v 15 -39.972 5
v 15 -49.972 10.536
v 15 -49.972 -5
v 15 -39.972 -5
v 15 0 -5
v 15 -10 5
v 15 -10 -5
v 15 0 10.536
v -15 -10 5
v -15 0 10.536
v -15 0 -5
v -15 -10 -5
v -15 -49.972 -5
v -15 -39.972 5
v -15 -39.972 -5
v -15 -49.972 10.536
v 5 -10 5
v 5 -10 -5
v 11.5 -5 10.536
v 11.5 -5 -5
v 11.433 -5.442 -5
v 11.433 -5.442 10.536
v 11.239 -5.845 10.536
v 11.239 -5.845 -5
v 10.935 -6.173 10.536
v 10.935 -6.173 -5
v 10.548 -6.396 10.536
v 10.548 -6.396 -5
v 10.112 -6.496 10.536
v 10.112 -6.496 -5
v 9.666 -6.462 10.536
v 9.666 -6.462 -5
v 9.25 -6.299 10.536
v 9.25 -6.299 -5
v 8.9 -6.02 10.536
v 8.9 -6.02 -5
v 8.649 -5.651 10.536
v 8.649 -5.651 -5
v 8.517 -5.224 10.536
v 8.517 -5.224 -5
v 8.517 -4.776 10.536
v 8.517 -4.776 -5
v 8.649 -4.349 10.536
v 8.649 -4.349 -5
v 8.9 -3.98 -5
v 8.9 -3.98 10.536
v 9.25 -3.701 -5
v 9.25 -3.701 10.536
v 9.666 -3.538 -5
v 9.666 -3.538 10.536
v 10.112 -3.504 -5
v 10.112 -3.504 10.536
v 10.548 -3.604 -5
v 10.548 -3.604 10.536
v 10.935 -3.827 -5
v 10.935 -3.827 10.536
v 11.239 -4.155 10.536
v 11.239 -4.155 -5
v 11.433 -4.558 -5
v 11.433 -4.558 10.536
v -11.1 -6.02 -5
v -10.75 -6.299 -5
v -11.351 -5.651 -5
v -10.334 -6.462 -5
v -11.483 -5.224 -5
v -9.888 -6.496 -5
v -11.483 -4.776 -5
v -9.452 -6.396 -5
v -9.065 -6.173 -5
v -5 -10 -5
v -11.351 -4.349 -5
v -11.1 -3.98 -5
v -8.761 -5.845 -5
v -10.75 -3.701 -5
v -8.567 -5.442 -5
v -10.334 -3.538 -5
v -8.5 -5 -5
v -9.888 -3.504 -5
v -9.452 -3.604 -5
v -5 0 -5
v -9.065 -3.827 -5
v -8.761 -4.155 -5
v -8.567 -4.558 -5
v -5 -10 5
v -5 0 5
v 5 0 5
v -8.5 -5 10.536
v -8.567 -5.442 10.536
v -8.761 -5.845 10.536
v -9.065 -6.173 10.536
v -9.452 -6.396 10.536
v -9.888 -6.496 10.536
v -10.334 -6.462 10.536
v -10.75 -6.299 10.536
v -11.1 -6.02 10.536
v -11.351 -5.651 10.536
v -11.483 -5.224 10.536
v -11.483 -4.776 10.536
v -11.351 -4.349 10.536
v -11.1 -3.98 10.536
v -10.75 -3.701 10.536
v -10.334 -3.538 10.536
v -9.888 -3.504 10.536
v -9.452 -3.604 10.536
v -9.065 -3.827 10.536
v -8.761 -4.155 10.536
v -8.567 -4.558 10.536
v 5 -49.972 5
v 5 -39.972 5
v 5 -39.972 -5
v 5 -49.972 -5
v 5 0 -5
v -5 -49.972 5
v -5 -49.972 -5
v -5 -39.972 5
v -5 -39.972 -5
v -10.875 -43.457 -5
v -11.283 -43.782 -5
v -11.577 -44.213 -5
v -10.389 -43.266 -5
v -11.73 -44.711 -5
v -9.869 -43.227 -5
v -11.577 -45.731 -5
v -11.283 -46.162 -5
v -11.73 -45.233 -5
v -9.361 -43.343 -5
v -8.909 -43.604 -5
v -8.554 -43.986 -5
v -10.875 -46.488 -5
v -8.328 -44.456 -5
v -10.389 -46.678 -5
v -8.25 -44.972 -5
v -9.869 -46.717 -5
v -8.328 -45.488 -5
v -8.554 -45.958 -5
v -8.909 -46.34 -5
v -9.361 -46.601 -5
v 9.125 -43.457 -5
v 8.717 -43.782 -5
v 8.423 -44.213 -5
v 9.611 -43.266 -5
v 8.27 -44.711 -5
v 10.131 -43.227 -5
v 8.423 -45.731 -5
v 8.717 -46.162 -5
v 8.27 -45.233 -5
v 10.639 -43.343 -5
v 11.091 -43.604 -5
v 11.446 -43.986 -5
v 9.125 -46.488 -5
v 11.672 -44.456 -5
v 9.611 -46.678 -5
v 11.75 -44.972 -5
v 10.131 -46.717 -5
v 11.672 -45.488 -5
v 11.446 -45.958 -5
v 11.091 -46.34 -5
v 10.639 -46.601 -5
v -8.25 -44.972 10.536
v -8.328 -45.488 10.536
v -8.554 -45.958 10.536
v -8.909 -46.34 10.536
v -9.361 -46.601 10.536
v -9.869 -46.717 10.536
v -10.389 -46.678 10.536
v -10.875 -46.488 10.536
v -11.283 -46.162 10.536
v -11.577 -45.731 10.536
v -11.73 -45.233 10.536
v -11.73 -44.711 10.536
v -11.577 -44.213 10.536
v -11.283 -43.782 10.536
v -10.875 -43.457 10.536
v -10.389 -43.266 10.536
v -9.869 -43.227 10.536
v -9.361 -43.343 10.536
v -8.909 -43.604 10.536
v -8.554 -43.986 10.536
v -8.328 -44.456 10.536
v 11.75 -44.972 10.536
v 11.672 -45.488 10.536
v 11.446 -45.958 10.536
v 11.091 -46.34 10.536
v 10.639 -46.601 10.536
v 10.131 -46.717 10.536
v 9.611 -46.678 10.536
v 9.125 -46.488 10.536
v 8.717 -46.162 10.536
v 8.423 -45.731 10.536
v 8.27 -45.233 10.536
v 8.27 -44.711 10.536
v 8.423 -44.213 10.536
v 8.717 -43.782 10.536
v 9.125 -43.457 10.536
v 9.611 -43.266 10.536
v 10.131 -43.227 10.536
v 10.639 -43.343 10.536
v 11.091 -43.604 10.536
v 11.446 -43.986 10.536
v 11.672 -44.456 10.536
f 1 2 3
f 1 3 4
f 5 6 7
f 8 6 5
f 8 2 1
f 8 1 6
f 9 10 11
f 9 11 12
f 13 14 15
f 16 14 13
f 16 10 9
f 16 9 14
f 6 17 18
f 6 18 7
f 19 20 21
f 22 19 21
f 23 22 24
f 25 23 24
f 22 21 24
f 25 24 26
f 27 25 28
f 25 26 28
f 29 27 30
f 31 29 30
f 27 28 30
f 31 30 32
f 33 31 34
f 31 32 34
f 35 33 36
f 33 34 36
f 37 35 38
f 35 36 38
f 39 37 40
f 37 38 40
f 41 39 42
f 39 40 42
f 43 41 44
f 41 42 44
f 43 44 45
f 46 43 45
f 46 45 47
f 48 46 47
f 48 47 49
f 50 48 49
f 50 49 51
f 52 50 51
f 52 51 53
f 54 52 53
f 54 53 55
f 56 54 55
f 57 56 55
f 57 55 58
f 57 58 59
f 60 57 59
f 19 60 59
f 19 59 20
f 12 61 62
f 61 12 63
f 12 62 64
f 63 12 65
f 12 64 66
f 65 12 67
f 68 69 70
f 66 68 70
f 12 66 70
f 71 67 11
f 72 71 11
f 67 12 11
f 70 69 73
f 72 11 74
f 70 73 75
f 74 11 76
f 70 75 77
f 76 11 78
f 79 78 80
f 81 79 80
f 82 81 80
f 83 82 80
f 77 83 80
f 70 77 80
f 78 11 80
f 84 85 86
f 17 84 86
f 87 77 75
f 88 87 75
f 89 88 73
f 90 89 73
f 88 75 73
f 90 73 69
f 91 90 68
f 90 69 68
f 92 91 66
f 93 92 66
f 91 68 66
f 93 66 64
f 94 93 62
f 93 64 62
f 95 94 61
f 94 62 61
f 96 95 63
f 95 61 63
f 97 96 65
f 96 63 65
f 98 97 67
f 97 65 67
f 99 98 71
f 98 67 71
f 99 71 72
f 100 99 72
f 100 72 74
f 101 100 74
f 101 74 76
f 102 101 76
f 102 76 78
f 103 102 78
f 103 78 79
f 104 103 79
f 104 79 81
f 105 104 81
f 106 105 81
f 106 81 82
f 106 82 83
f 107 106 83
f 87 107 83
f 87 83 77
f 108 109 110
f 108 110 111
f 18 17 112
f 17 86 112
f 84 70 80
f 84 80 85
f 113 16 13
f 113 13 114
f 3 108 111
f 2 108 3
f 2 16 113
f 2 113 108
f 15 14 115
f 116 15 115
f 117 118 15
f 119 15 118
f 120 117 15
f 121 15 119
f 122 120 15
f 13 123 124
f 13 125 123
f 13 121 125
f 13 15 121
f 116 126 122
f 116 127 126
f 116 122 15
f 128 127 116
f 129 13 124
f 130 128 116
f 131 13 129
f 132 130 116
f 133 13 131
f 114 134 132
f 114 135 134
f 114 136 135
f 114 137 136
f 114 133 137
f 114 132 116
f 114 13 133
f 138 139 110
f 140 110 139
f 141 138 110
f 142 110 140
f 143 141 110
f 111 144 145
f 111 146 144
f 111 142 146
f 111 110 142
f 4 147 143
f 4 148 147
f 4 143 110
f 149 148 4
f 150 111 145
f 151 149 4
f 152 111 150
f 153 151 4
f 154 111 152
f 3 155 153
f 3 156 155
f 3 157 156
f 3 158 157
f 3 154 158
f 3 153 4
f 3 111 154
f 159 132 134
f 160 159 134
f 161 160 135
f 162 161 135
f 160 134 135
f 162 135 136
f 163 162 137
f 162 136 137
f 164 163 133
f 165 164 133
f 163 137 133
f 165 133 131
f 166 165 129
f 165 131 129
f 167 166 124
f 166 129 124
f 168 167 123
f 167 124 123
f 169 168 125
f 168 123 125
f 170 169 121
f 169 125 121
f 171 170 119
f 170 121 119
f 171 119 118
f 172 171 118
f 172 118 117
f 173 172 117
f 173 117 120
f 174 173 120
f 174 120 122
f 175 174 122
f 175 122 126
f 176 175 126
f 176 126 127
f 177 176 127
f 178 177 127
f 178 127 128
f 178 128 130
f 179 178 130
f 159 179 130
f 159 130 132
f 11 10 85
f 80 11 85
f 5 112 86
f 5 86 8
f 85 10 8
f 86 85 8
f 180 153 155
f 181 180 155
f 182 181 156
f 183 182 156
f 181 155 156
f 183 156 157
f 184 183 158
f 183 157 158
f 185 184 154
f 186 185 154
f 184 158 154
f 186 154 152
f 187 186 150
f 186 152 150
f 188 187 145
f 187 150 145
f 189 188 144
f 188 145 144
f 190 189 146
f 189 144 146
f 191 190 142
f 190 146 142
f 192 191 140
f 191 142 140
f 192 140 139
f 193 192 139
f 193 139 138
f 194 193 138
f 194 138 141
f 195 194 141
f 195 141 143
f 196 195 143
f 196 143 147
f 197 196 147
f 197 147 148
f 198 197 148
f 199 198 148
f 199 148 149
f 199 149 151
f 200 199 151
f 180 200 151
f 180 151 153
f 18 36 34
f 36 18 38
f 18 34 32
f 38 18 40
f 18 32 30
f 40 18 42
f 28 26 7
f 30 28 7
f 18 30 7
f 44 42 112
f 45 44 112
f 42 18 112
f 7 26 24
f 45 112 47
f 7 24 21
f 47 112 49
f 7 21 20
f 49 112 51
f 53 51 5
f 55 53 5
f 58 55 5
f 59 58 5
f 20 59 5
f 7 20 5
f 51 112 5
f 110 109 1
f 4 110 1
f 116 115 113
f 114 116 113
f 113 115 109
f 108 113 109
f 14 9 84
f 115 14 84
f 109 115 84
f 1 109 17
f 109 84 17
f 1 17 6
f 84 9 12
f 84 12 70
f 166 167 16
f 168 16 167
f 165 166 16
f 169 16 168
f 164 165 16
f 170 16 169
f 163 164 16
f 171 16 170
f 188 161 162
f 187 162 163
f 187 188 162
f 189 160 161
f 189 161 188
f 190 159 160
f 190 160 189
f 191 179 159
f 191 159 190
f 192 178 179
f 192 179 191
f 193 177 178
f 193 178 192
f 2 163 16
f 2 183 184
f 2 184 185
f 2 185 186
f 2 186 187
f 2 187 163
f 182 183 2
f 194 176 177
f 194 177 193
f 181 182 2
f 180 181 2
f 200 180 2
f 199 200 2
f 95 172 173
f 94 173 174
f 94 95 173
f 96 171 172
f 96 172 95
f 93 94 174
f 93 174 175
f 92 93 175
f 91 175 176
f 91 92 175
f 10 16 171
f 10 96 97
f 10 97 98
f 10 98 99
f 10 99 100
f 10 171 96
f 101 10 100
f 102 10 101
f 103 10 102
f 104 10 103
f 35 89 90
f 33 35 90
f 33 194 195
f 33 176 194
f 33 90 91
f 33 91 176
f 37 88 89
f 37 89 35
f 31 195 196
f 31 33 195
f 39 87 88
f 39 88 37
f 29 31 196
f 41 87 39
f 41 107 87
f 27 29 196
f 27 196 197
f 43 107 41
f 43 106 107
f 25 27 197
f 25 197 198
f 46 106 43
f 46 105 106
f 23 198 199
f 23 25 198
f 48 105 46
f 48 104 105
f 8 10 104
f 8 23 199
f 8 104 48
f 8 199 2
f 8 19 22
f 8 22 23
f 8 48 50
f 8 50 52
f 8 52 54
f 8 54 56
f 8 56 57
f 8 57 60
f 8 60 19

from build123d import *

# Parameters (mm, degrees)
F1_DEPTH  = 10
F2_R      = 1.5
F3_DEPTH  = 16
F5_W      = 30
F5_H      = 29.9720647931
F5_H_2    = 10
F5_R      = 1.5
F6_DEPTH  = 5.53592
F7_W      = 10
F7_H      = 10
F8_DEPTH  = 10
F9_R      = 1.75
F10_DEPTH = 25


with BuildPart() as f1:
    # F0 (on Front) → F1 (new body)
    with BuildSketch(Plane.XZ):
        Polygon((-5, 5), (5, 5), (5, -5), (15, -5), (15, 5), (15, 7.7369394712), (15, 10.5359181762), (10.6142175943, 10.5359181762), (0, 10.5359181762), (-10.6142175943, 10.5359181762), (-15, 10.5359181762), (-15, 7.7369394712), (-15, 5), (-15, -5), (-5, -5), align=None)
    extrude(amount=F1_DEPTH)

    # F2 (on face) → F3 (cut)
    with BuildSketch(Plane(origin=(0, 0, -5), x_dir=(1, 0, 0), z_dir=(0, 0, -1))):
        with Locations((10, 5)):
            Circle(F2_R)
        with Locations((-10, 5)):
            Circle(F2_R)
    extrude(amount=-F3_DEPTH, mode=Mode.SUBTRACT)

    # F5 (on face) → F6 (join)
    with BuildSketch(Plane.XY.offset(10.5359181762)):
        with Locations((0, -24.9860323966)):
            Rectangle(F5_W, F5_H)
        with Locations((0, -44.9720647931)):
            Rectangle(F5_W, F5_H_2)
        with Locations((-10, -44.9720647931)):
            Circle(F5_R, mode=Mode.SUBTRACT)
        with Locations((10, -44.9720647931)):
            Circle(F5_R, mode=Mode.SUBTRACT)
    extrude(amount=-F6_DEPTH)

    # F7 (on face) → F8 (join)
    with BuildSketch(Plane(origin=(0, 0, 5), x_dir=(1, 0, 0), z_dir=(0, 0, -1))):
        with Locations((10, 44.9720647931)):
            Rectangle(F7_W, F7_H)
        with Locations((-10, 44.9720647931)):
            Rectangle(F7_W, F7_H)
    extrude(amount=F8_DEPTH)

    # F9 (on face) → F10 (cut)
    with BuildSketch(Plane(origin=(0, 0, -5), x_dir=(1, 0, 0), z_dir=(0, 0, -1))):
        with Locations((-10, 44.9720647931)):
            Circle(F9_R)
        with Locations((10, 44.9720647931)):
            Circle(F9_R)
    extrude(amount=-F10_DEPTH, mode=Mode.SUBTRACT)


solid = f1.part
